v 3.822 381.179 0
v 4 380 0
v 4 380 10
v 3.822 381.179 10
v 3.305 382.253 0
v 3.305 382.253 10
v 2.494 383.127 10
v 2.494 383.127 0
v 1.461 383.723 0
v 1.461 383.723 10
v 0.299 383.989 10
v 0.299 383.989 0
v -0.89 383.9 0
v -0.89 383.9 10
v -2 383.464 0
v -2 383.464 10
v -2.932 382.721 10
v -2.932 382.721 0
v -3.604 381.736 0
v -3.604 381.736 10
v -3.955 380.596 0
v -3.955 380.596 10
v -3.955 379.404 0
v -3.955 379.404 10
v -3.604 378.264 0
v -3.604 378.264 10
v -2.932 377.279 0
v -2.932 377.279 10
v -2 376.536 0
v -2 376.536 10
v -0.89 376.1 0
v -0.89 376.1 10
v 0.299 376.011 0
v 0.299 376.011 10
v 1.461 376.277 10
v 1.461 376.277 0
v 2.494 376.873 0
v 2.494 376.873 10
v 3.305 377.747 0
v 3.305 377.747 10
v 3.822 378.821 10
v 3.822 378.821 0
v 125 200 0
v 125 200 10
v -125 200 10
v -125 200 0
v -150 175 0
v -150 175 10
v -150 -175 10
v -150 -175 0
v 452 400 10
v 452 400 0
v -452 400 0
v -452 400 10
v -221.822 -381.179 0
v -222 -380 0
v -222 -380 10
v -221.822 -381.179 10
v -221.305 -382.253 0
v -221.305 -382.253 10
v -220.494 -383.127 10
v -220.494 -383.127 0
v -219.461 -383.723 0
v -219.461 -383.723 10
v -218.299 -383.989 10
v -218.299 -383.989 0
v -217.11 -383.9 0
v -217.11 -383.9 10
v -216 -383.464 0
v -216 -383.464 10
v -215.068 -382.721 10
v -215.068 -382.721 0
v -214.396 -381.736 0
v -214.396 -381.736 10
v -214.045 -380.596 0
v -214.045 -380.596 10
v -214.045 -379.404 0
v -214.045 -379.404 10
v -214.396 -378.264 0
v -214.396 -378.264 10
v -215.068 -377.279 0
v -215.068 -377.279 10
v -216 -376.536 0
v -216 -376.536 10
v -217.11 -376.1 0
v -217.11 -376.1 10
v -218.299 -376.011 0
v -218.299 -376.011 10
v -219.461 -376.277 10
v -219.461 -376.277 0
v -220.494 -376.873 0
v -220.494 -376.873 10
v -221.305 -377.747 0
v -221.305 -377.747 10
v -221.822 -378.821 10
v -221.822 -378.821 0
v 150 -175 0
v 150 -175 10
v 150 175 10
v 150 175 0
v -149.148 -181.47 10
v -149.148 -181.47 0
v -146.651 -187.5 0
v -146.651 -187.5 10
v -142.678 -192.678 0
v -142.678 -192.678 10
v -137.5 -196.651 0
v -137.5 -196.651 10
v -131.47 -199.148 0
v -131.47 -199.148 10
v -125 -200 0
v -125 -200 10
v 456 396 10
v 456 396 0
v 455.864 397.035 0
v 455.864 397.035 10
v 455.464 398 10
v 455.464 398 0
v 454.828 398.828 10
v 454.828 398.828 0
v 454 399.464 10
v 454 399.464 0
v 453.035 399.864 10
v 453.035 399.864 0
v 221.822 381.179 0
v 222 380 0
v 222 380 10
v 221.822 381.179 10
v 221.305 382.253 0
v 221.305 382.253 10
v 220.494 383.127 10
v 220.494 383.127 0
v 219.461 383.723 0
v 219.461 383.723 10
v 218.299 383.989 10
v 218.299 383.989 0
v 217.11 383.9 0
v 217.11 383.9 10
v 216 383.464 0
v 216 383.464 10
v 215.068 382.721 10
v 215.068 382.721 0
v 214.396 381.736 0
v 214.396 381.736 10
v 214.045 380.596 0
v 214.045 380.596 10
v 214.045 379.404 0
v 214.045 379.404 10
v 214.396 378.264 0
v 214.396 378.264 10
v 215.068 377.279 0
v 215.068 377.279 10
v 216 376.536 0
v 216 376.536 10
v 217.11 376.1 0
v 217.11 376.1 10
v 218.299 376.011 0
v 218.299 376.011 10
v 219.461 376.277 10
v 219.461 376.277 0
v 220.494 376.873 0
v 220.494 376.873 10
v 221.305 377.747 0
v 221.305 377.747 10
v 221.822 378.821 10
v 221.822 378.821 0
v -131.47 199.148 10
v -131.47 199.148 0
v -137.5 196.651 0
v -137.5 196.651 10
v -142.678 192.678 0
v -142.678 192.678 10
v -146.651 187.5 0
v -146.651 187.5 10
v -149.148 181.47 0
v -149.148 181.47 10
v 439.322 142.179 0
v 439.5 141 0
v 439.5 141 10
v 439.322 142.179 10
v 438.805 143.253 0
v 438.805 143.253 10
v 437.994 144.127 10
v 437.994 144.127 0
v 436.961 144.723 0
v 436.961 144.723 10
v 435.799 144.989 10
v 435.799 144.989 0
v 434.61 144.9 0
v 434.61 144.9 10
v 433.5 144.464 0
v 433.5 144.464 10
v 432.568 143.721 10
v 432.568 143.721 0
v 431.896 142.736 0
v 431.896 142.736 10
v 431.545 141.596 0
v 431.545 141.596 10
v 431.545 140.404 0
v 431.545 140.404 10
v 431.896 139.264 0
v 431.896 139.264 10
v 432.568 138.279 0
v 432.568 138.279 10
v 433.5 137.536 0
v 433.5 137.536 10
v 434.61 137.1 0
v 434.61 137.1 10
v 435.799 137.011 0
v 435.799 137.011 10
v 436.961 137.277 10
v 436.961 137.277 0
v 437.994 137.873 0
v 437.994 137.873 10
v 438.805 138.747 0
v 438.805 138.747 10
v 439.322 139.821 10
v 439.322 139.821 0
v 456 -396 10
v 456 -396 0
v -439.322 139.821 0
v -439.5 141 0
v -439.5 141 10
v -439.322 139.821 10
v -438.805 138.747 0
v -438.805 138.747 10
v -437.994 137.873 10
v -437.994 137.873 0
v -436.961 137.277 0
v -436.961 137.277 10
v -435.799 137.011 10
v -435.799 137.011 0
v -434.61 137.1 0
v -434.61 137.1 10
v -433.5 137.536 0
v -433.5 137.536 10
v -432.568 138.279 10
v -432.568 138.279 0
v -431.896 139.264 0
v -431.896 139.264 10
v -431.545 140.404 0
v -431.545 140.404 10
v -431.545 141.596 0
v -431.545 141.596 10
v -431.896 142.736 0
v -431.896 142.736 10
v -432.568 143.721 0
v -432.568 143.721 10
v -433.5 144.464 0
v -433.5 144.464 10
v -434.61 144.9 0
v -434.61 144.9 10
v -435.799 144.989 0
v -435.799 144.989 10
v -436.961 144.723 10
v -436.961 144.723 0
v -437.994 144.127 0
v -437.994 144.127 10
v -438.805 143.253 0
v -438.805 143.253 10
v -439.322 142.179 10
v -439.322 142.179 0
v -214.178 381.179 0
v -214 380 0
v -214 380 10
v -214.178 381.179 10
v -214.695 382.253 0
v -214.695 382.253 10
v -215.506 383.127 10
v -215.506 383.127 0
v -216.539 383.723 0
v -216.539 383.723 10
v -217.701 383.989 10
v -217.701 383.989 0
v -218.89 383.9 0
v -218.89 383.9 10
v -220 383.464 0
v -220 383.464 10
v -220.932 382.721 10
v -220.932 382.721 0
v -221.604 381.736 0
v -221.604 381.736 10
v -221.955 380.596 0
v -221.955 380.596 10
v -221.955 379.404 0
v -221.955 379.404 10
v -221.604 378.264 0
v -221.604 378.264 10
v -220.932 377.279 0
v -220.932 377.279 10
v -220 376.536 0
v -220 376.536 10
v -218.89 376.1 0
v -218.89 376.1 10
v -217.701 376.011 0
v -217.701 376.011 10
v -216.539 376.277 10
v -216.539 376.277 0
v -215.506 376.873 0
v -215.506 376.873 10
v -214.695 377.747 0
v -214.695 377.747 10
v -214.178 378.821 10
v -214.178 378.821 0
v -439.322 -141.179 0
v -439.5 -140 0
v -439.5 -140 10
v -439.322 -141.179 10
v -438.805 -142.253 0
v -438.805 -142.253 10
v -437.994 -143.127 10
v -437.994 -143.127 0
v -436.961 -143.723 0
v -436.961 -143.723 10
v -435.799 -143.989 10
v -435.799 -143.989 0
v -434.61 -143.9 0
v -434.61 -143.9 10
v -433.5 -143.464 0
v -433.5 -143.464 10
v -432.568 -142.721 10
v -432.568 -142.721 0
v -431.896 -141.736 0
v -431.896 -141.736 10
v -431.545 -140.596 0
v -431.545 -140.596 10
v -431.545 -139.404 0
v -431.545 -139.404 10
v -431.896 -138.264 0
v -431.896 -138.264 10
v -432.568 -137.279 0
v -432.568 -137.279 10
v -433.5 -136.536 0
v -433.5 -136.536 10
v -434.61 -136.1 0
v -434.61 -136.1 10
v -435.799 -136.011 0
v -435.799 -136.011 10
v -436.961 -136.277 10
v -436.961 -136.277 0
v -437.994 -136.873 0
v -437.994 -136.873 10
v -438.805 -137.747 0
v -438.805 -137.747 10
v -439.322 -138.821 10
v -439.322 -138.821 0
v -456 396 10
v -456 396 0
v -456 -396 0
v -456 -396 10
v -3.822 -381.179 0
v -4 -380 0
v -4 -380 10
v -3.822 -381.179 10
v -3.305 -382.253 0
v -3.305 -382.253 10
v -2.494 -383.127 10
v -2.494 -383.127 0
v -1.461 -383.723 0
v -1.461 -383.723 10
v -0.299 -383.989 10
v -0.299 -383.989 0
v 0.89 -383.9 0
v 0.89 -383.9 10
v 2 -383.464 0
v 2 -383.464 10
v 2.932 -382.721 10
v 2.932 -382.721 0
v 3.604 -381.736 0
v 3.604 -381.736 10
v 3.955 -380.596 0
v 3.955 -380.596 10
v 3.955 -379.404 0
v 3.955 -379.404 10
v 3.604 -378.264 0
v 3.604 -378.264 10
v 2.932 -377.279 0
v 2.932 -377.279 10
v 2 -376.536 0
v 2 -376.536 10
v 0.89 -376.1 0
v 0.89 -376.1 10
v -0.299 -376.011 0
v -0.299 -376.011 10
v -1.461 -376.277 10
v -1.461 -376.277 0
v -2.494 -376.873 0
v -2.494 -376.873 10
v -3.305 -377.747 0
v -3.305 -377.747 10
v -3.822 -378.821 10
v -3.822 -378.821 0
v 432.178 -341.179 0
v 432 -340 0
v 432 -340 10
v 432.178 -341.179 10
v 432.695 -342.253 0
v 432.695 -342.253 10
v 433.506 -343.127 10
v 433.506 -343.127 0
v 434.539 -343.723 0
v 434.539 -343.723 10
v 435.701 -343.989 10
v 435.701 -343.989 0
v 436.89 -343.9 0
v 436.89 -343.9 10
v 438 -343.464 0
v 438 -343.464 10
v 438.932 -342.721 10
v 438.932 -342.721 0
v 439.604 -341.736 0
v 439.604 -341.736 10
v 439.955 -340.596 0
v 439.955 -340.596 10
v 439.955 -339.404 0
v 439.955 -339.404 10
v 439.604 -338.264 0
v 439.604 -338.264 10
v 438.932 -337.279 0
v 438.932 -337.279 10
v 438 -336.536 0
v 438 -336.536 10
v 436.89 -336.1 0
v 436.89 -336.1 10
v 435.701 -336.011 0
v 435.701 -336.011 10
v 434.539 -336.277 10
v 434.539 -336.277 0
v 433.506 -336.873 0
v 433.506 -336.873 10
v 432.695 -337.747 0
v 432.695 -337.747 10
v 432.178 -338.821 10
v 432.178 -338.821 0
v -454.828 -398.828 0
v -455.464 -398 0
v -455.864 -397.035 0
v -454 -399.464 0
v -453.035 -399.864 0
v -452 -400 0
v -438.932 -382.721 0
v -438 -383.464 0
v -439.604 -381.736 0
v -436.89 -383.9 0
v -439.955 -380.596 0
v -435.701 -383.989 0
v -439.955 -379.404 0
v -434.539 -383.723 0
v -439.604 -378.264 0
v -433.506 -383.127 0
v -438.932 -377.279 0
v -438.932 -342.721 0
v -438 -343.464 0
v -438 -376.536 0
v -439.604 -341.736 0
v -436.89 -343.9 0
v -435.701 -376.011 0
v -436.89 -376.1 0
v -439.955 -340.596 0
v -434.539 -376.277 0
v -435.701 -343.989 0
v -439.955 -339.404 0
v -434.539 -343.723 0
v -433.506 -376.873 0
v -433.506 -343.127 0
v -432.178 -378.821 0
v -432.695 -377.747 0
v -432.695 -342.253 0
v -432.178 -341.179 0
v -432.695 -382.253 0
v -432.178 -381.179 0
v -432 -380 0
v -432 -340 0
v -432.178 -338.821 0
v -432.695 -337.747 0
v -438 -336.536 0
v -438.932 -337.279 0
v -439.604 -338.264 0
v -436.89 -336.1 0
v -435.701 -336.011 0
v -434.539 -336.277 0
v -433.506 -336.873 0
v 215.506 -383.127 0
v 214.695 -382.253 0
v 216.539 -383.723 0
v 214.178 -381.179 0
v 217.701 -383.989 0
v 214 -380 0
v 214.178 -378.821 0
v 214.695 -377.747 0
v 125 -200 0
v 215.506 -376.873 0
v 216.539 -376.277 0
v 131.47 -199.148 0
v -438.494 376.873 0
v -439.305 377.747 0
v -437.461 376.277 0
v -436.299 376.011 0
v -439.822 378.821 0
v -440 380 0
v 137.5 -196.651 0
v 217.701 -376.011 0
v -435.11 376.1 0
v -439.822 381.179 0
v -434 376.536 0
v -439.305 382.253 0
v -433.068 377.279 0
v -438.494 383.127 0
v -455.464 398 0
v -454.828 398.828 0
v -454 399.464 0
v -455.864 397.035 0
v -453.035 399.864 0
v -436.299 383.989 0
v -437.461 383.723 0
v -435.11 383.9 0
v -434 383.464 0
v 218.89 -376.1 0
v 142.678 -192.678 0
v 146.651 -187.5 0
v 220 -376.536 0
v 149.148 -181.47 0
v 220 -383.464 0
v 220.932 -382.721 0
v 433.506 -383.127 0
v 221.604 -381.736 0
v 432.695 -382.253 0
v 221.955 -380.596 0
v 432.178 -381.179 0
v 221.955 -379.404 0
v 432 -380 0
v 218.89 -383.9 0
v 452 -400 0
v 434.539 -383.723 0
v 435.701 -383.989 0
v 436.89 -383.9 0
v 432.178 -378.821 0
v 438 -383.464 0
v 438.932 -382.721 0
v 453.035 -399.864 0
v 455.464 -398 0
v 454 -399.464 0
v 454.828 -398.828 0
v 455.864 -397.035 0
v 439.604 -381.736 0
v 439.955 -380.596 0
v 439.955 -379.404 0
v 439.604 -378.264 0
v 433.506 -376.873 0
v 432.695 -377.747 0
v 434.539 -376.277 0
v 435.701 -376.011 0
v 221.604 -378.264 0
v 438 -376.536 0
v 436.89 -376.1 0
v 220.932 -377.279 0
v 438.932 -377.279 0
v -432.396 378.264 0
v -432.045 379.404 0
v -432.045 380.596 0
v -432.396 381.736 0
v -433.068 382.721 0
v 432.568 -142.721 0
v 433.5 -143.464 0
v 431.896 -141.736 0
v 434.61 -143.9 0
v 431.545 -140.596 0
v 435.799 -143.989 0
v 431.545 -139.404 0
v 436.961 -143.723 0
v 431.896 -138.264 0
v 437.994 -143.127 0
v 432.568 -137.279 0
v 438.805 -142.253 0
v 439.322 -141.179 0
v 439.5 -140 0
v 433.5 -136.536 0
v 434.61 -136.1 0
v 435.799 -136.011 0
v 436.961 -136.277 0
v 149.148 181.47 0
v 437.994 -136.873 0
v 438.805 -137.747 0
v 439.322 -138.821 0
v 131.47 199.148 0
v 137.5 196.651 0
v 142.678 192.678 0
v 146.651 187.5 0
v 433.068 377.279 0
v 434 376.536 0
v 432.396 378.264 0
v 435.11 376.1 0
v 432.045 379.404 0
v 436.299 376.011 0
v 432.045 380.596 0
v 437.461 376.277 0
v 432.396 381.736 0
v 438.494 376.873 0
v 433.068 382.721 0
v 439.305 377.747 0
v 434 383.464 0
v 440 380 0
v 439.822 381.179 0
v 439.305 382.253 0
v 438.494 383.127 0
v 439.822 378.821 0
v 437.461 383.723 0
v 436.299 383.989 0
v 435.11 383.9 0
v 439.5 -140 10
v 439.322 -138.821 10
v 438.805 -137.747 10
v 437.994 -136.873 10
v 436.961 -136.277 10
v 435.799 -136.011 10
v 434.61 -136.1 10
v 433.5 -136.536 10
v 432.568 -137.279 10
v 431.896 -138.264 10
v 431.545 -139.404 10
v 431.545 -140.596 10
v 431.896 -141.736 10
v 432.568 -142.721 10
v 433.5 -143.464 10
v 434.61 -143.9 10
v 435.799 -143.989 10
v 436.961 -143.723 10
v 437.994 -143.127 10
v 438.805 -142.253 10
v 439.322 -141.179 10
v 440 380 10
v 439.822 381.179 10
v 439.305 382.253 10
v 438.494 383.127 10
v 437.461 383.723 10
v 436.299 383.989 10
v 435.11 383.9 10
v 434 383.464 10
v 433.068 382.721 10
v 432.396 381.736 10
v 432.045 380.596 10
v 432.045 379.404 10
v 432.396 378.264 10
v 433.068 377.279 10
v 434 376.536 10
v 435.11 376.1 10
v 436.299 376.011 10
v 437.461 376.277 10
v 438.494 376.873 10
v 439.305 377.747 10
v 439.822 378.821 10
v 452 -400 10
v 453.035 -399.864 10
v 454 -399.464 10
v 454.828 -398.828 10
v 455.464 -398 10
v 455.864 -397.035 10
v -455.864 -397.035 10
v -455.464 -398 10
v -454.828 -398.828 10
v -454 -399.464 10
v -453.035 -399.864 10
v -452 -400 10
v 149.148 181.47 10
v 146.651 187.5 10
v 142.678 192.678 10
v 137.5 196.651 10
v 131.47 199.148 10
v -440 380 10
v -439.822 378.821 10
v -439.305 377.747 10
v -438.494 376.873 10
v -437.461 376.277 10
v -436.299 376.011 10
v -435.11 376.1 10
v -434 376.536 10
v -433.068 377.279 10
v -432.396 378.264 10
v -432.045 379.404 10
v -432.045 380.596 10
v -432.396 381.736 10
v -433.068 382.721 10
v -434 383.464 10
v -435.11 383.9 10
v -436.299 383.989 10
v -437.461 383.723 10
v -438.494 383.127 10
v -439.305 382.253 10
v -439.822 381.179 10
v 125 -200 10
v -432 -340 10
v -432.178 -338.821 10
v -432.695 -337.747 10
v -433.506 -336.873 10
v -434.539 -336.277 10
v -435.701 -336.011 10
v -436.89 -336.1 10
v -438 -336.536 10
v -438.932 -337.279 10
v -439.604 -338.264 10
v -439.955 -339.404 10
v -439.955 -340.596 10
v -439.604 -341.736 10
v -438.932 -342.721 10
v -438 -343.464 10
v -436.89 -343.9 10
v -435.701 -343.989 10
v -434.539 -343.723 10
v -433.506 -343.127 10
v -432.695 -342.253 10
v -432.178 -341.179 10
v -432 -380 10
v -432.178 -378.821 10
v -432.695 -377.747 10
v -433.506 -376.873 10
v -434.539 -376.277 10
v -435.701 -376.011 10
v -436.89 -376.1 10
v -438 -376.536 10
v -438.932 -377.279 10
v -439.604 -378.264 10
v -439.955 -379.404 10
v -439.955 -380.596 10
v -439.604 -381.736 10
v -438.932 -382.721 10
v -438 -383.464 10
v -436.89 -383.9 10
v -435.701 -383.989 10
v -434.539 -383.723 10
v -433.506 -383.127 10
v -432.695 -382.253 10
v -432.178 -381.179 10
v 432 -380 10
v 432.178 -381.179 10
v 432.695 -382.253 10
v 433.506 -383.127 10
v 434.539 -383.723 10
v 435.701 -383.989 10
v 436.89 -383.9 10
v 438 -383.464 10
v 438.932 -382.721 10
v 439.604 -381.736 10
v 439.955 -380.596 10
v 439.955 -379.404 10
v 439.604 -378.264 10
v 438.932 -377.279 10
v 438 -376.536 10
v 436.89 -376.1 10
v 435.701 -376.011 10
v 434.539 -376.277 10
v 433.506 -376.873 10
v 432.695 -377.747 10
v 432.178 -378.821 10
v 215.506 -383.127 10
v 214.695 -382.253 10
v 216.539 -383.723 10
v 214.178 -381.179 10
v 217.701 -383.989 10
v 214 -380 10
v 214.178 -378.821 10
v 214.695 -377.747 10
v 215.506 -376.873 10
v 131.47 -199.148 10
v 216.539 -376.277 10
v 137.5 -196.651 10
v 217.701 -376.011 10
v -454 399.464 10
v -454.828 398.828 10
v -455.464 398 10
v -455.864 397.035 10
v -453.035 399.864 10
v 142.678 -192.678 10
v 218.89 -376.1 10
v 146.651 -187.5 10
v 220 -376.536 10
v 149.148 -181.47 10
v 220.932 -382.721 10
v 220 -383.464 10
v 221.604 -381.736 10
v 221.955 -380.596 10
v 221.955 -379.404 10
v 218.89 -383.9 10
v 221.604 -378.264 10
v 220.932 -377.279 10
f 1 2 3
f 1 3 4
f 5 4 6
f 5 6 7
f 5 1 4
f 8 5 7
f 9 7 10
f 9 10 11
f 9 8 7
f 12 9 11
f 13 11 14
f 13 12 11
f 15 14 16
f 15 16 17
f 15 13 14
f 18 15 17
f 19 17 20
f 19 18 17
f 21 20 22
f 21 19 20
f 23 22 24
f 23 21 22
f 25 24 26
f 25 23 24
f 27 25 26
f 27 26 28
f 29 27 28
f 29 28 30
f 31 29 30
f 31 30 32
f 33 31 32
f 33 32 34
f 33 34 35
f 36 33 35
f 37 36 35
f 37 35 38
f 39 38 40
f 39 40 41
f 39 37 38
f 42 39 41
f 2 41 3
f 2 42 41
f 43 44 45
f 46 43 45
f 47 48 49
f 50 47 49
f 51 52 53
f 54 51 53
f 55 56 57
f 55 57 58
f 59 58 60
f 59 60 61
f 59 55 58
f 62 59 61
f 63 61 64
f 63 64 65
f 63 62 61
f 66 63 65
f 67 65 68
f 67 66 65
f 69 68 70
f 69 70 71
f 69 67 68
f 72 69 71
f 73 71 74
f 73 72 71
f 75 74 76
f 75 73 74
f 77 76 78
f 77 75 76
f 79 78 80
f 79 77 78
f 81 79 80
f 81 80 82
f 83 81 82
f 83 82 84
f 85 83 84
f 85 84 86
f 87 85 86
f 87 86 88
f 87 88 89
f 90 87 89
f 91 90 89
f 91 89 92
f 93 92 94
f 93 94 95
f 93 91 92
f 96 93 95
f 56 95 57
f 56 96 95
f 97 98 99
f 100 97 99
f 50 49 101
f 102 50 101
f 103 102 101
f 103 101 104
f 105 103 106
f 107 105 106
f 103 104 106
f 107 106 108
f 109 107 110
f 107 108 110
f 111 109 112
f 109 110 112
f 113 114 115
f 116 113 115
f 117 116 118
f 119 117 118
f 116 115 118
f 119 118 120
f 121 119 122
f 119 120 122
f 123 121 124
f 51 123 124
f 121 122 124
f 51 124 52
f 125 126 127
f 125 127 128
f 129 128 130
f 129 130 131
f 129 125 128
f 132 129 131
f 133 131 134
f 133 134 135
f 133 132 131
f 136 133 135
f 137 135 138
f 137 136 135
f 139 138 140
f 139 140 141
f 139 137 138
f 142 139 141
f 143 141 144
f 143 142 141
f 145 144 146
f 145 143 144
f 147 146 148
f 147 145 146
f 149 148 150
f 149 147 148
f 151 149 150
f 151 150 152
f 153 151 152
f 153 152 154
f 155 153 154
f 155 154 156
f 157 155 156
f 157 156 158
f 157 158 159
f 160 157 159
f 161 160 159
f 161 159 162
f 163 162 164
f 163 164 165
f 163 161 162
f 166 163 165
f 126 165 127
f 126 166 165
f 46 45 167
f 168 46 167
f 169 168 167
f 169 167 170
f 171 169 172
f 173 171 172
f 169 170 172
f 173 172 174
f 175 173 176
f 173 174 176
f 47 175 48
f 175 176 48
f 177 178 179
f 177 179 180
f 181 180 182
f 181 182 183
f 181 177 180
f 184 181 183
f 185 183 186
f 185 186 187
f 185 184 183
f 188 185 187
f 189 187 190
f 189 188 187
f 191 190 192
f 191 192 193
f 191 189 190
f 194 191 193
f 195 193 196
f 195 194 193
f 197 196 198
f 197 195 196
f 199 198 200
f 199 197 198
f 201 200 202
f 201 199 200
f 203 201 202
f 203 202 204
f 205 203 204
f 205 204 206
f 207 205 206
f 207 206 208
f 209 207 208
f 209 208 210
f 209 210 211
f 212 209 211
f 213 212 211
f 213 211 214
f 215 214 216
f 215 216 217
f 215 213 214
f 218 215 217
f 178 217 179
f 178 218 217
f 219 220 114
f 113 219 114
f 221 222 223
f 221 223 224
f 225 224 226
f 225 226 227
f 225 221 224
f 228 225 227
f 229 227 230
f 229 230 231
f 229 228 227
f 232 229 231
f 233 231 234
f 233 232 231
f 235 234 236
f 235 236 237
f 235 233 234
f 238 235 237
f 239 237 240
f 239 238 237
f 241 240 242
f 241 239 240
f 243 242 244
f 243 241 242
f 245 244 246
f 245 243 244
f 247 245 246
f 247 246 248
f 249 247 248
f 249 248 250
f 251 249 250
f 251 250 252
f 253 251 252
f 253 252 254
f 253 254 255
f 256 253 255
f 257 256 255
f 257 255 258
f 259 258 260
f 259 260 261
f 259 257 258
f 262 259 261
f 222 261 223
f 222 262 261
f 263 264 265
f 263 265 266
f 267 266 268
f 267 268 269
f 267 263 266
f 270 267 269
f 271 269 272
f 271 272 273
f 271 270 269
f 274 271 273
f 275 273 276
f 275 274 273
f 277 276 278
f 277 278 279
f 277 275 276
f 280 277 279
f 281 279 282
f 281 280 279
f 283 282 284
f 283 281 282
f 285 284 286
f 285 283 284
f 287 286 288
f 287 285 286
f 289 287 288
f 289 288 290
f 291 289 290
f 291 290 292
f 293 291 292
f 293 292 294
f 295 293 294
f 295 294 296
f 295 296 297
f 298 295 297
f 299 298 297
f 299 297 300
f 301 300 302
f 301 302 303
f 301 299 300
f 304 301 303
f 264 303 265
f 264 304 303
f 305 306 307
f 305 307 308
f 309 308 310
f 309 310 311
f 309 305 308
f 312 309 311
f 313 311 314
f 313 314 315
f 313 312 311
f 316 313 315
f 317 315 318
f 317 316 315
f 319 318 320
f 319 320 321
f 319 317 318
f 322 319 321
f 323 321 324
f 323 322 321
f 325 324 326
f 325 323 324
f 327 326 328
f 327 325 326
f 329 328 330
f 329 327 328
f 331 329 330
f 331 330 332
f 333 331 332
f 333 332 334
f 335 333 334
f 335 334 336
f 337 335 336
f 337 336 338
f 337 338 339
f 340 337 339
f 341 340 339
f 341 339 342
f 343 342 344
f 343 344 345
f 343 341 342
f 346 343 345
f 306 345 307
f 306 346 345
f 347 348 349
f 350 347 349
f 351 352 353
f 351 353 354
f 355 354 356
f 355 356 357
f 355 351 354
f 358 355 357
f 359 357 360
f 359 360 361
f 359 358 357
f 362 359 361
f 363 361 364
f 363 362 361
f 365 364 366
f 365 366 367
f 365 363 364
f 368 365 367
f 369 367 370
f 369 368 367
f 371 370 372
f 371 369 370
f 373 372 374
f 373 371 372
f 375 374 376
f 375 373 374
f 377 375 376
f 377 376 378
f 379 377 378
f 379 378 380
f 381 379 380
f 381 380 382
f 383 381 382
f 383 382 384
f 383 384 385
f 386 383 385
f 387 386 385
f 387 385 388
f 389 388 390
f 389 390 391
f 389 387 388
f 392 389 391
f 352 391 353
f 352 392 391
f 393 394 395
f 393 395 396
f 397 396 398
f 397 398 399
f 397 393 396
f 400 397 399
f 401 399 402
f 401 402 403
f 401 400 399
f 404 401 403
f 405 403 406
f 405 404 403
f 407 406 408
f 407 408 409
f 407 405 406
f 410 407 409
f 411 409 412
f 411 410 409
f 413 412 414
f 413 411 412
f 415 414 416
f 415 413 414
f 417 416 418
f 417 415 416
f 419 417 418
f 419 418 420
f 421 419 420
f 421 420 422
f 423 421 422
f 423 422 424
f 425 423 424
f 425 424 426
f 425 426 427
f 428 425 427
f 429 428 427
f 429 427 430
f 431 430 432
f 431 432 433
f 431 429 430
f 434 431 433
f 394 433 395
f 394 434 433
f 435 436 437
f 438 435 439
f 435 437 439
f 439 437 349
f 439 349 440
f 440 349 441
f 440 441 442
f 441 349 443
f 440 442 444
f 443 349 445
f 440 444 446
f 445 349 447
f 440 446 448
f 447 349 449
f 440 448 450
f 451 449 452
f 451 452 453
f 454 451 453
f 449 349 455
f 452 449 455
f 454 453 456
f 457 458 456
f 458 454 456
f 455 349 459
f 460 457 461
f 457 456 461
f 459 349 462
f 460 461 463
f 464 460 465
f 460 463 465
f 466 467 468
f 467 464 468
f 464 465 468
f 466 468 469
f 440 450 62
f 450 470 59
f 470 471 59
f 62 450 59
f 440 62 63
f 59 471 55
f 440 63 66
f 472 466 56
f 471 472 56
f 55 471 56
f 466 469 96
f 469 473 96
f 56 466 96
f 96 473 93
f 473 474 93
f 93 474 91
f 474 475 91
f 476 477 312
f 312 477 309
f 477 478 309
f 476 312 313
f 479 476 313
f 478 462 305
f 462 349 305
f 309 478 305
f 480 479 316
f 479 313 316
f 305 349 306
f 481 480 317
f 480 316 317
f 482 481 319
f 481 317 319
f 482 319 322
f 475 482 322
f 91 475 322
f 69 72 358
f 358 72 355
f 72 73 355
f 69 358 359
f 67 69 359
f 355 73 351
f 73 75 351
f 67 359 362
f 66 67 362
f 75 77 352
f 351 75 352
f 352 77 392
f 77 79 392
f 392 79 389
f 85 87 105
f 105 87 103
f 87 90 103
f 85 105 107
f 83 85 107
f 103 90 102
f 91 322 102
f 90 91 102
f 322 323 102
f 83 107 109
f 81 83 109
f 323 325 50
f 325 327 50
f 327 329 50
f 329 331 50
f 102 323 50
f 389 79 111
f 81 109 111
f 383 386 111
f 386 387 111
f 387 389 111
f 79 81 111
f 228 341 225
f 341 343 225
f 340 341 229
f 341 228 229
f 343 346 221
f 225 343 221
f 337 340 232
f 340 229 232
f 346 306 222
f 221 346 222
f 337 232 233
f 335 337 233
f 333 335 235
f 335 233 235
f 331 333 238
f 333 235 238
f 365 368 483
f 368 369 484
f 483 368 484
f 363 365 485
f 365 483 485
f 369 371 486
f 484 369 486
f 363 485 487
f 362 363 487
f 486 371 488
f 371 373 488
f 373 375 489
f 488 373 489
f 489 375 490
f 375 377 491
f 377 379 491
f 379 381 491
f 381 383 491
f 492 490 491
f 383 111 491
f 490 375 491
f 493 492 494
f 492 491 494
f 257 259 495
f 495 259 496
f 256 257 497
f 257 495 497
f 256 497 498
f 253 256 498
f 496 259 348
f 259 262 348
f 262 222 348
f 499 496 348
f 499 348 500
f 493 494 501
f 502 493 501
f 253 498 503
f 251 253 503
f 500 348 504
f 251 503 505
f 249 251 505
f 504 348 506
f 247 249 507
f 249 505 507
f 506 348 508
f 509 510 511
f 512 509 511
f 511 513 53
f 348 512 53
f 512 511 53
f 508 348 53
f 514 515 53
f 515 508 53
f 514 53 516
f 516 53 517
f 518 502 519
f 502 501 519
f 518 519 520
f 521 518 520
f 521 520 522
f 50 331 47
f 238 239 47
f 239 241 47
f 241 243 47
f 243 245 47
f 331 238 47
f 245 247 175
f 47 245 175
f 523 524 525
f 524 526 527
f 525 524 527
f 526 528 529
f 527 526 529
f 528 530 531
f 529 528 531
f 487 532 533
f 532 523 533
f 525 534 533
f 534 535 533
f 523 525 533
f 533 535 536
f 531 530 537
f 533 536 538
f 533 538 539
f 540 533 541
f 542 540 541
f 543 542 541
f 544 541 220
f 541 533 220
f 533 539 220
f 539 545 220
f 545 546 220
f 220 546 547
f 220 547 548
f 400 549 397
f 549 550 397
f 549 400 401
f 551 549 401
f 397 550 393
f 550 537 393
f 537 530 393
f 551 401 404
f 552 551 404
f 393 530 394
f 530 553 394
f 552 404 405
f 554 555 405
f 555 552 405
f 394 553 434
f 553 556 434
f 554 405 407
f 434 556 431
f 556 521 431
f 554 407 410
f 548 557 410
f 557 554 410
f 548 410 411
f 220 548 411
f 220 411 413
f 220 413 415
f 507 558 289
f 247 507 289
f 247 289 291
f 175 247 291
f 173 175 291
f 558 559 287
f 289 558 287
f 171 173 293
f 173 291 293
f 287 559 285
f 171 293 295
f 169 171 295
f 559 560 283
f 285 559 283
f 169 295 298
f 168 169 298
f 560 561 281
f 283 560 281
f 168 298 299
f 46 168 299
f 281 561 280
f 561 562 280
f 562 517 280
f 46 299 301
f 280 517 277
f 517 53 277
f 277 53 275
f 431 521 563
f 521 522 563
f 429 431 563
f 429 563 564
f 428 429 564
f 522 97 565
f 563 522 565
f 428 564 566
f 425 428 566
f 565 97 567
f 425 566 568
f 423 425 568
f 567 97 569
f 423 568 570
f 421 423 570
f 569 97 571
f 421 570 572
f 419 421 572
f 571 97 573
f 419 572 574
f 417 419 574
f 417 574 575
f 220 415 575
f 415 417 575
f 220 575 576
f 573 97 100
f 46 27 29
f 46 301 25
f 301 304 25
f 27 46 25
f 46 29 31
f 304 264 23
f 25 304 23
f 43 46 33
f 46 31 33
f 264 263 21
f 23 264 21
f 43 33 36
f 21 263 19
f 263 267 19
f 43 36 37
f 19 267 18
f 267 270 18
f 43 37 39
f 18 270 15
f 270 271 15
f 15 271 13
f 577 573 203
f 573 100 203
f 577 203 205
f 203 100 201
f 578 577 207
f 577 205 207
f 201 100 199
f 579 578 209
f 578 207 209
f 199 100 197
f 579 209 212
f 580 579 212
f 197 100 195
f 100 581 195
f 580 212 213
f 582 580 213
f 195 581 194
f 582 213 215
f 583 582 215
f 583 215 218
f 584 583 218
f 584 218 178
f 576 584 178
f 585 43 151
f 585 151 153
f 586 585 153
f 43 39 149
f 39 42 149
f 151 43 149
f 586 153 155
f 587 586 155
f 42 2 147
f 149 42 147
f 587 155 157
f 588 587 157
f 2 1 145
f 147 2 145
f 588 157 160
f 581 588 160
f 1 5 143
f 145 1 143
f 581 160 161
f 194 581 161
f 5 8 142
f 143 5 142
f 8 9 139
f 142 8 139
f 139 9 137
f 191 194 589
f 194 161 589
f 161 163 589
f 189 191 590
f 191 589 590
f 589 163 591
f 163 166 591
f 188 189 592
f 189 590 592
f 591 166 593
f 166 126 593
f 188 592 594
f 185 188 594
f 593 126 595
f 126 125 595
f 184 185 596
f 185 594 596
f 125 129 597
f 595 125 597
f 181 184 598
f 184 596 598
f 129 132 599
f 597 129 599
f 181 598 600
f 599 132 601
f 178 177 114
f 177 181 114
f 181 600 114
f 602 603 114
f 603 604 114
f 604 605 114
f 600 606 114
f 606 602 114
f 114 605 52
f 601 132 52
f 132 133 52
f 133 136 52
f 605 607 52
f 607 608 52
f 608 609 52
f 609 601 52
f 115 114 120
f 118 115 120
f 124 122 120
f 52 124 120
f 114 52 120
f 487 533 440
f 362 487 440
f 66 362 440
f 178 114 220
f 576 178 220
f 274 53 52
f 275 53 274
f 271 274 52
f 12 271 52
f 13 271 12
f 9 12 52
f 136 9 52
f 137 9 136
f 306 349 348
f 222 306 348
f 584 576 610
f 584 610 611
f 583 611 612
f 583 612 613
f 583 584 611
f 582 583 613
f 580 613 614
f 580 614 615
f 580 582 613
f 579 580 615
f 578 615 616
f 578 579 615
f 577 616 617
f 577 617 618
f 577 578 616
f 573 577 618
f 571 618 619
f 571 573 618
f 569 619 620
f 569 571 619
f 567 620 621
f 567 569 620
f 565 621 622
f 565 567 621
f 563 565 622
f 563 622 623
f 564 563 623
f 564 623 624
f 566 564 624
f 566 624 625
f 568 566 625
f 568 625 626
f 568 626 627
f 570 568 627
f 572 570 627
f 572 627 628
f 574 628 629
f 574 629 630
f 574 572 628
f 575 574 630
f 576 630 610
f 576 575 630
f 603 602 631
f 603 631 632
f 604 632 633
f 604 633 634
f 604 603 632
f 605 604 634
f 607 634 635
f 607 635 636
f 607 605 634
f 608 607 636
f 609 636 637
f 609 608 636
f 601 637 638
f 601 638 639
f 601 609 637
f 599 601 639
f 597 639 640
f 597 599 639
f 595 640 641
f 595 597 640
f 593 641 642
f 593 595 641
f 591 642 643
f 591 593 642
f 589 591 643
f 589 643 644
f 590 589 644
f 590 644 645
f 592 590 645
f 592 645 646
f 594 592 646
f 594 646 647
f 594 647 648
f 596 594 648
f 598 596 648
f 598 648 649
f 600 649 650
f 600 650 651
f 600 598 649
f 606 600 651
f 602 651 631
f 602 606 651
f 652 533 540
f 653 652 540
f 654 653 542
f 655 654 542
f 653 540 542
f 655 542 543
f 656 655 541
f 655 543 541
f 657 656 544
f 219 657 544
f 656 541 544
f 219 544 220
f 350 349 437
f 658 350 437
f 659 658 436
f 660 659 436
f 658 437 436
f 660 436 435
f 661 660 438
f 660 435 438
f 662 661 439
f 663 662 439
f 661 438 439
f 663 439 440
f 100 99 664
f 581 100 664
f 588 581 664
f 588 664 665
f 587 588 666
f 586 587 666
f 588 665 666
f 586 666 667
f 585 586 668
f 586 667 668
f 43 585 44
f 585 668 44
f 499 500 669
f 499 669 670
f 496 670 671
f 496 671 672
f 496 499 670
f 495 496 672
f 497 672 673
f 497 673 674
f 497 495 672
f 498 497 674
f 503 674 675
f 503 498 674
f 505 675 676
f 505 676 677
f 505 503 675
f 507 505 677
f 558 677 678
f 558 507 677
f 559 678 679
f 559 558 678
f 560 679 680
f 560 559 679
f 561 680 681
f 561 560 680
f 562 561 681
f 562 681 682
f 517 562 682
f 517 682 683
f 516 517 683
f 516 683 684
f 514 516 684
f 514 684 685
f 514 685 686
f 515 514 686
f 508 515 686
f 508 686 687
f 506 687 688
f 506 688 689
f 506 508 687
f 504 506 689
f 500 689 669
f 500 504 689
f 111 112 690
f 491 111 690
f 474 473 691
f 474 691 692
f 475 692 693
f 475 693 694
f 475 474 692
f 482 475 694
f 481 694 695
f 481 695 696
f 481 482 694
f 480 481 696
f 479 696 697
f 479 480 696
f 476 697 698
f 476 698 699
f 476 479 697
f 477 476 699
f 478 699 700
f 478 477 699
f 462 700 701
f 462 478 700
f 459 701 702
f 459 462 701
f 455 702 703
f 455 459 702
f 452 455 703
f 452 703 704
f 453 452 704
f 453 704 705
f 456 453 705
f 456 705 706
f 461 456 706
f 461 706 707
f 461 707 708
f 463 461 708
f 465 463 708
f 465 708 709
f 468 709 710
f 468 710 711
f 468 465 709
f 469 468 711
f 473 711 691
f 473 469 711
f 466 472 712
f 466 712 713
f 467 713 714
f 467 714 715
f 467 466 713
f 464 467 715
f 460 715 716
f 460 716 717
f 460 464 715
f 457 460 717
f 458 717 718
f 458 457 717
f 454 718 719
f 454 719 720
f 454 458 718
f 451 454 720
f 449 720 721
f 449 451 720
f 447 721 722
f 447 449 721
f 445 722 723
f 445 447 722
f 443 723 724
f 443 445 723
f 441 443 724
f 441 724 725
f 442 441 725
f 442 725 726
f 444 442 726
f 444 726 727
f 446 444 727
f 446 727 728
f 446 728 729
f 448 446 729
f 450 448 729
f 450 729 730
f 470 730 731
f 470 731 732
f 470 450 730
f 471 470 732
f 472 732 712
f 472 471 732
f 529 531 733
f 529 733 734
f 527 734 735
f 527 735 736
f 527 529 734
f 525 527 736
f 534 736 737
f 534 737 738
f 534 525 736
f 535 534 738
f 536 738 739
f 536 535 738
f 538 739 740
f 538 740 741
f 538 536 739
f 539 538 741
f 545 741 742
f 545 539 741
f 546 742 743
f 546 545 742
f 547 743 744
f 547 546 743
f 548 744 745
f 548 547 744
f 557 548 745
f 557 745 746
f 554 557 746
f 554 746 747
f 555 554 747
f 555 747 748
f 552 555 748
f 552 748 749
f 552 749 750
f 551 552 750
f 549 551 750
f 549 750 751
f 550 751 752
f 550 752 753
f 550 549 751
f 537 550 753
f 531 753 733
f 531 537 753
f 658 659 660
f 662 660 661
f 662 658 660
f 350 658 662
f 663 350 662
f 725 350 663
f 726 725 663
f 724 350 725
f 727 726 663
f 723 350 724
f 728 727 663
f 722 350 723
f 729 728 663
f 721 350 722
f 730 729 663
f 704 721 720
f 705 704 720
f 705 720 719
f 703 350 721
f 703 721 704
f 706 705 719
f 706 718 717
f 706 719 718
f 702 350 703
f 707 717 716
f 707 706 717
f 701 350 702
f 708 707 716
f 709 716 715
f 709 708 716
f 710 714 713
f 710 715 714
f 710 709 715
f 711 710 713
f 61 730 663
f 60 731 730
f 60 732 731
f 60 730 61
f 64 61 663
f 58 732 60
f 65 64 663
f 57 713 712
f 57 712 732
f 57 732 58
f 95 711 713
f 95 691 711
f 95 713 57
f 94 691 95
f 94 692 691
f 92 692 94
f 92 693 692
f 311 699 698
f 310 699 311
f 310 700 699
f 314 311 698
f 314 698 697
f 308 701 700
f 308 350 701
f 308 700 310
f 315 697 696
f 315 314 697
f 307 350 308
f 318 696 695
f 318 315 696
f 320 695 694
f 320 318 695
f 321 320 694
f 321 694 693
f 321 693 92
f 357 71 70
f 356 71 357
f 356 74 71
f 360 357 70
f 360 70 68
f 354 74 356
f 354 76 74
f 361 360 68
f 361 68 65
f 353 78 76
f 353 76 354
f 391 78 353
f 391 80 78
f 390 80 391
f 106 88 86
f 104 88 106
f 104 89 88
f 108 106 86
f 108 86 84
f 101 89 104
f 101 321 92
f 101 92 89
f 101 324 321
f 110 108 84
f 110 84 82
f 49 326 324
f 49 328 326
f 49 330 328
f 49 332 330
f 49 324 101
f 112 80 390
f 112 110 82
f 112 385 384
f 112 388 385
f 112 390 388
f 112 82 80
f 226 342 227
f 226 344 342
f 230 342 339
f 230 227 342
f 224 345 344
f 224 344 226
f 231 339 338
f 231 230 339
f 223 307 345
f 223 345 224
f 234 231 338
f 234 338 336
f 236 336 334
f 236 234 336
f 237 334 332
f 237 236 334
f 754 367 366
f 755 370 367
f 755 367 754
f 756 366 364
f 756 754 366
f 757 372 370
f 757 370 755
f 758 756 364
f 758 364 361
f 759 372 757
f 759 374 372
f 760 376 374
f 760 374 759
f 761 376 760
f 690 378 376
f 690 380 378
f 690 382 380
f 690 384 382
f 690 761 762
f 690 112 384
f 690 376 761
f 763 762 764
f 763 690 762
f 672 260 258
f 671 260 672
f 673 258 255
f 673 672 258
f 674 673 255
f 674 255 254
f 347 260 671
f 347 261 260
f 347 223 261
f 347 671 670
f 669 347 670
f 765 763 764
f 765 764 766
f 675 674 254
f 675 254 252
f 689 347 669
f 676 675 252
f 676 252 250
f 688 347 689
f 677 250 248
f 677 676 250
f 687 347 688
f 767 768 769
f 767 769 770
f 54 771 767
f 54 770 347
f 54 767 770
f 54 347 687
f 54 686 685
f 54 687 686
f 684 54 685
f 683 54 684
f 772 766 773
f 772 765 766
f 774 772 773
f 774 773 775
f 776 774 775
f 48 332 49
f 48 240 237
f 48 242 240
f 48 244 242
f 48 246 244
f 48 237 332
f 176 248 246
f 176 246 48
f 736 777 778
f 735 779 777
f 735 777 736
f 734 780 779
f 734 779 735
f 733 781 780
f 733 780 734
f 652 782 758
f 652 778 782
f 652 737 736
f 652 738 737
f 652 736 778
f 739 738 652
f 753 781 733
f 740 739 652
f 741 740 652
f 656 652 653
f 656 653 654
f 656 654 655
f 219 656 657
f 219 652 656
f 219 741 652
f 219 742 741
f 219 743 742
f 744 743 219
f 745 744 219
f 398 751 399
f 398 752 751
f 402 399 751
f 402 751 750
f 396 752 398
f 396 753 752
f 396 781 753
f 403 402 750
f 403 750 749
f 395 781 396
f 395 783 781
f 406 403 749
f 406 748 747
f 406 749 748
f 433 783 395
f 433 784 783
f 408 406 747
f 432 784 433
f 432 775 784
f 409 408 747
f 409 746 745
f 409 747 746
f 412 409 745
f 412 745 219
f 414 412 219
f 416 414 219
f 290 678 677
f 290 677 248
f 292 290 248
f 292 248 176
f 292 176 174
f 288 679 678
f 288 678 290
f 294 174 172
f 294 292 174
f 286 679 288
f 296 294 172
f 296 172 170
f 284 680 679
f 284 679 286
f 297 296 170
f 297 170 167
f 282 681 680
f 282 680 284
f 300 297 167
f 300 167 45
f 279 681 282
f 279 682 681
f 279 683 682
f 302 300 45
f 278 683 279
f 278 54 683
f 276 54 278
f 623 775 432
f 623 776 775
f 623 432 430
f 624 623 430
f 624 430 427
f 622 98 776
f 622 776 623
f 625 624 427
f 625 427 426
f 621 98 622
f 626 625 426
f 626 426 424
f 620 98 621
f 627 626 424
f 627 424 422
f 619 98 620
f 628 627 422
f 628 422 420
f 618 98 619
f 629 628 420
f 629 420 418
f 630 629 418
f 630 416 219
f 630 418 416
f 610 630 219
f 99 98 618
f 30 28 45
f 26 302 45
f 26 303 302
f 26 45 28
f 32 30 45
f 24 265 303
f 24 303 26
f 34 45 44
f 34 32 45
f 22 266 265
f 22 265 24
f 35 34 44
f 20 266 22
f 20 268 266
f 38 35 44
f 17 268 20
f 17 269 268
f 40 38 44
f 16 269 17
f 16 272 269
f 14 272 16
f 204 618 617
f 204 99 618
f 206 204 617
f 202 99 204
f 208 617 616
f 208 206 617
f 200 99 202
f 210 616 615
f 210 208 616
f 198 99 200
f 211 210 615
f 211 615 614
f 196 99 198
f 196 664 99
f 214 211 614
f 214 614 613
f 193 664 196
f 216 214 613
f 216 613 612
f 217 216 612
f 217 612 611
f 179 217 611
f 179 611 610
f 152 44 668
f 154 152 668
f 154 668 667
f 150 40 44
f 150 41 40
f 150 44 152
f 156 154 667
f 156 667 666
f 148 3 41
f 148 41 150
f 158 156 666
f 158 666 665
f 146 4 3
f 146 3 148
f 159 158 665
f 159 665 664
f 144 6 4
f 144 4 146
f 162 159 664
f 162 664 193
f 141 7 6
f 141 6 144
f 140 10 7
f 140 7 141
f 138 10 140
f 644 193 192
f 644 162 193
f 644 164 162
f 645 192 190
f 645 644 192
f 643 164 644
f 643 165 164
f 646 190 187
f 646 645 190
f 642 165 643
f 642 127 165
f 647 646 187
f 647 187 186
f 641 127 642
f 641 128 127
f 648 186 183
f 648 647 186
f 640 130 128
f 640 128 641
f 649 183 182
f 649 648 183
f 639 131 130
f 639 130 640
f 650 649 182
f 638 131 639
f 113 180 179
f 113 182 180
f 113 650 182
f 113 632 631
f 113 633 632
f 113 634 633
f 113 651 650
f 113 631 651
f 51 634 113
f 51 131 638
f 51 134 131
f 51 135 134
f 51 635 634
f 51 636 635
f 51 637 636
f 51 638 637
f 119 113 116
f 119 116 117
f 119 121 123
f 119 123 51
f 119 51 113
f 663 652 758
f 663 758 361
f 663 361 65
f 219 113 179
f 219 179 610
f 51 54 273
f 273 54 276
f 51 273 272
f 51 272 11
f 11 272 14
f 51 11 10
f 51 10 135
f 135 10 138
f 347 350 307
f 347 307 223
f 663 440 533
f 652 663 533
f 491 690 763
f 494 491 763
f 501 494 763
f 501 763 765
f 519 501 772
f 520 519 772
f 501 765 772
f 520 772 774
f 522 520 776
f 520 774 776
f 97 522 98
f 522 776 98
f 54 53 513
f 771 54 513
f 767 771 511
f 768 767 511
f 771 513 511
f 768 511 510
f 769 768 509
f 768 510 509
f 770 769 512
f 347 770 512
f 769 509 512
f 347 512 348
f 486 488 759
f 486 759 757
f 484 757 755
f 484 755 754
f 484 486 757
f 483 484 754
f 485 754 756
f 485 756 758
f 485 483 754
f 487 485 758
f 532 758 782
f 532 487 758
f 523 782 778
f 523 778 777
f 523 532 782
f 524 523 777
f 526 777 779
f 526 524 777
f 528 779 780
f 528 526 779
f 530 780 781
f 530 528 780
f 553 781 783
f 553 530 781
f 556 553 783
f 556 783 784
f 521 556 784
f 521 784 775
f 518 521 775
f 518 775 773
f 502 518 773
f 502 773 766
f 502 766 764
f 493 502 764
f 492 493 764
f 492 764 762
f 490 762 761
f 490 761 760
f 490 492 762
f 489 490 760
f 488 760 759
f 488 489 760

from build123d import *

# Parameters (mm, degrees)
ESQUISSE1_R             = 4
BOSS_EXTRU_1_DEPTH      = 10
ENL_V_MAT_EXTRU_1_DEPTH = 607.65970692


with BuildPart() as part:
    # Esquisse1 → Boss.-Extru.1 (new body)
    with BuildSketch(Plane.XY):
        with BuildLine():
            Line((-452, -400), (452, -400))
            ThreePointArc((452, -400), (454.828427125, -398.828427125), (456, -396))
            Line((456, -396), (456, 396))
            ThreePointArc((456, 396), (454.828427125, 398.828427125), (452, 400))
            Line((452, 400), (-452, 400))
            ThreePointArc((-452, 400), (-454.828427125, 398.828427125), (-456, 396))
            Line((-456, 396), (-456, -396))
            ThreePointArc((-456, -396), (-454.828427125, -398.828427125), (-452, -400))
        make_face()
        with Locations((436, 380)):
            Circle(ESQUISSE1_R, mode=Mode.SUBTRACT)
        with Locations((435.5, -140)):
            Circle(ESQUISSE1_R, mode=Mode.SUBTRACT)
        with Locations((435.5, 141)):
            Circle(ESQUISSE1_R, mode=Mode.SUBTRACT)
        with Locations(Location((-435.5, -140, 0), (0, 0, 180))):
            Circle(ESQUISSE1_R, mode=Mode.SUBTRACT)
        with Locations(Location((-436, 380, 0), (0, 0, 180))):
            Circle(ESQUISSE1_R, mode=Mode.SUBTRACT)
        with Locations(Location((-435.5, 141, 0), (0, 0, 180))):
            Circle(ESQUISSE1_R, mode=Mode.SUBTRACT)
        with Locations(Location((436, -380, 0), (0, 0, 180))):
            Circle(ESQUISSE1_R, mode=Mode.SUBTRACT)
        with Locations(Location((436, -340, 0), (0, 0, 180))):
            Circle(ESQUISSE1_R, mode=Mode.SUBTRACT)
        with Locations((-436, -340)):
            Circle(ESQUISSE1_R, mode=Mode.SUBTRACT)
        with Locations((-436, -380)):
            Circle(ESQUISSE1_R, mode=Mode.SUBTRACT)
        with Locations(Location((218, -380, 0), (0, 0, 180))):
            Circle(ESQUISSE1_R, mode=Mode.SUBTRACT)
        with Locations(Location((0, -380, 0), (0, 0, 180))):
            Circle(ESQUISSE1_R, mode=Mode.SUBTRACT)
        with Locations(Location((-218, -380, 0), (0, 0, 180))):
            Circle(ESQUISSE1_R, mode=Mode.SUBTRACT)
        with Locations((-218, 380)):
            Circle(ESQUISSE1_R, mode=Mode.SUBTRACT)
        with Locations((0, 380)):
            Circle(ESQUISSE1_R, mode=Mode.SUBTRACT)
        with Locations((218, 380)):
            Circle(ESQUISSE1_R, mode=Mode.SUBTRACT)
    extrude(amount=BOSS_EXTRU_1_DEPTH)

    # Esquisse2 → Enlèv. mat.-Extru.1 (cut, through all)
    with BuildSketch(Plane.XY.offset(10)):
        with BuildLine():
            Line((-125, -200), (125, -200))
            ThreePointArc((125, -200), (142.67766953, -192.67766953), (150, -175))
            Line((150, -175), (150, 175))
            ThreePointArc((150, 175), (142.67766953, 192.67766953), (125, 200))
            Line((125, 200), (-125, 200))
            ThreePointArc((-125, 200), (-142.67766953, 192.67766953), (-150, 175))
            Line((-150, 175), (-150, -175))
            ThreePointArc((-150, -175), (-142.67766953, -192.67766953), (-125, -200))
        make_face()
    extrude(amount=-ENL_V_MAT_EXTRU_1_DEPTH, mode=Mode.SUBTRACT)


solid = part.part
